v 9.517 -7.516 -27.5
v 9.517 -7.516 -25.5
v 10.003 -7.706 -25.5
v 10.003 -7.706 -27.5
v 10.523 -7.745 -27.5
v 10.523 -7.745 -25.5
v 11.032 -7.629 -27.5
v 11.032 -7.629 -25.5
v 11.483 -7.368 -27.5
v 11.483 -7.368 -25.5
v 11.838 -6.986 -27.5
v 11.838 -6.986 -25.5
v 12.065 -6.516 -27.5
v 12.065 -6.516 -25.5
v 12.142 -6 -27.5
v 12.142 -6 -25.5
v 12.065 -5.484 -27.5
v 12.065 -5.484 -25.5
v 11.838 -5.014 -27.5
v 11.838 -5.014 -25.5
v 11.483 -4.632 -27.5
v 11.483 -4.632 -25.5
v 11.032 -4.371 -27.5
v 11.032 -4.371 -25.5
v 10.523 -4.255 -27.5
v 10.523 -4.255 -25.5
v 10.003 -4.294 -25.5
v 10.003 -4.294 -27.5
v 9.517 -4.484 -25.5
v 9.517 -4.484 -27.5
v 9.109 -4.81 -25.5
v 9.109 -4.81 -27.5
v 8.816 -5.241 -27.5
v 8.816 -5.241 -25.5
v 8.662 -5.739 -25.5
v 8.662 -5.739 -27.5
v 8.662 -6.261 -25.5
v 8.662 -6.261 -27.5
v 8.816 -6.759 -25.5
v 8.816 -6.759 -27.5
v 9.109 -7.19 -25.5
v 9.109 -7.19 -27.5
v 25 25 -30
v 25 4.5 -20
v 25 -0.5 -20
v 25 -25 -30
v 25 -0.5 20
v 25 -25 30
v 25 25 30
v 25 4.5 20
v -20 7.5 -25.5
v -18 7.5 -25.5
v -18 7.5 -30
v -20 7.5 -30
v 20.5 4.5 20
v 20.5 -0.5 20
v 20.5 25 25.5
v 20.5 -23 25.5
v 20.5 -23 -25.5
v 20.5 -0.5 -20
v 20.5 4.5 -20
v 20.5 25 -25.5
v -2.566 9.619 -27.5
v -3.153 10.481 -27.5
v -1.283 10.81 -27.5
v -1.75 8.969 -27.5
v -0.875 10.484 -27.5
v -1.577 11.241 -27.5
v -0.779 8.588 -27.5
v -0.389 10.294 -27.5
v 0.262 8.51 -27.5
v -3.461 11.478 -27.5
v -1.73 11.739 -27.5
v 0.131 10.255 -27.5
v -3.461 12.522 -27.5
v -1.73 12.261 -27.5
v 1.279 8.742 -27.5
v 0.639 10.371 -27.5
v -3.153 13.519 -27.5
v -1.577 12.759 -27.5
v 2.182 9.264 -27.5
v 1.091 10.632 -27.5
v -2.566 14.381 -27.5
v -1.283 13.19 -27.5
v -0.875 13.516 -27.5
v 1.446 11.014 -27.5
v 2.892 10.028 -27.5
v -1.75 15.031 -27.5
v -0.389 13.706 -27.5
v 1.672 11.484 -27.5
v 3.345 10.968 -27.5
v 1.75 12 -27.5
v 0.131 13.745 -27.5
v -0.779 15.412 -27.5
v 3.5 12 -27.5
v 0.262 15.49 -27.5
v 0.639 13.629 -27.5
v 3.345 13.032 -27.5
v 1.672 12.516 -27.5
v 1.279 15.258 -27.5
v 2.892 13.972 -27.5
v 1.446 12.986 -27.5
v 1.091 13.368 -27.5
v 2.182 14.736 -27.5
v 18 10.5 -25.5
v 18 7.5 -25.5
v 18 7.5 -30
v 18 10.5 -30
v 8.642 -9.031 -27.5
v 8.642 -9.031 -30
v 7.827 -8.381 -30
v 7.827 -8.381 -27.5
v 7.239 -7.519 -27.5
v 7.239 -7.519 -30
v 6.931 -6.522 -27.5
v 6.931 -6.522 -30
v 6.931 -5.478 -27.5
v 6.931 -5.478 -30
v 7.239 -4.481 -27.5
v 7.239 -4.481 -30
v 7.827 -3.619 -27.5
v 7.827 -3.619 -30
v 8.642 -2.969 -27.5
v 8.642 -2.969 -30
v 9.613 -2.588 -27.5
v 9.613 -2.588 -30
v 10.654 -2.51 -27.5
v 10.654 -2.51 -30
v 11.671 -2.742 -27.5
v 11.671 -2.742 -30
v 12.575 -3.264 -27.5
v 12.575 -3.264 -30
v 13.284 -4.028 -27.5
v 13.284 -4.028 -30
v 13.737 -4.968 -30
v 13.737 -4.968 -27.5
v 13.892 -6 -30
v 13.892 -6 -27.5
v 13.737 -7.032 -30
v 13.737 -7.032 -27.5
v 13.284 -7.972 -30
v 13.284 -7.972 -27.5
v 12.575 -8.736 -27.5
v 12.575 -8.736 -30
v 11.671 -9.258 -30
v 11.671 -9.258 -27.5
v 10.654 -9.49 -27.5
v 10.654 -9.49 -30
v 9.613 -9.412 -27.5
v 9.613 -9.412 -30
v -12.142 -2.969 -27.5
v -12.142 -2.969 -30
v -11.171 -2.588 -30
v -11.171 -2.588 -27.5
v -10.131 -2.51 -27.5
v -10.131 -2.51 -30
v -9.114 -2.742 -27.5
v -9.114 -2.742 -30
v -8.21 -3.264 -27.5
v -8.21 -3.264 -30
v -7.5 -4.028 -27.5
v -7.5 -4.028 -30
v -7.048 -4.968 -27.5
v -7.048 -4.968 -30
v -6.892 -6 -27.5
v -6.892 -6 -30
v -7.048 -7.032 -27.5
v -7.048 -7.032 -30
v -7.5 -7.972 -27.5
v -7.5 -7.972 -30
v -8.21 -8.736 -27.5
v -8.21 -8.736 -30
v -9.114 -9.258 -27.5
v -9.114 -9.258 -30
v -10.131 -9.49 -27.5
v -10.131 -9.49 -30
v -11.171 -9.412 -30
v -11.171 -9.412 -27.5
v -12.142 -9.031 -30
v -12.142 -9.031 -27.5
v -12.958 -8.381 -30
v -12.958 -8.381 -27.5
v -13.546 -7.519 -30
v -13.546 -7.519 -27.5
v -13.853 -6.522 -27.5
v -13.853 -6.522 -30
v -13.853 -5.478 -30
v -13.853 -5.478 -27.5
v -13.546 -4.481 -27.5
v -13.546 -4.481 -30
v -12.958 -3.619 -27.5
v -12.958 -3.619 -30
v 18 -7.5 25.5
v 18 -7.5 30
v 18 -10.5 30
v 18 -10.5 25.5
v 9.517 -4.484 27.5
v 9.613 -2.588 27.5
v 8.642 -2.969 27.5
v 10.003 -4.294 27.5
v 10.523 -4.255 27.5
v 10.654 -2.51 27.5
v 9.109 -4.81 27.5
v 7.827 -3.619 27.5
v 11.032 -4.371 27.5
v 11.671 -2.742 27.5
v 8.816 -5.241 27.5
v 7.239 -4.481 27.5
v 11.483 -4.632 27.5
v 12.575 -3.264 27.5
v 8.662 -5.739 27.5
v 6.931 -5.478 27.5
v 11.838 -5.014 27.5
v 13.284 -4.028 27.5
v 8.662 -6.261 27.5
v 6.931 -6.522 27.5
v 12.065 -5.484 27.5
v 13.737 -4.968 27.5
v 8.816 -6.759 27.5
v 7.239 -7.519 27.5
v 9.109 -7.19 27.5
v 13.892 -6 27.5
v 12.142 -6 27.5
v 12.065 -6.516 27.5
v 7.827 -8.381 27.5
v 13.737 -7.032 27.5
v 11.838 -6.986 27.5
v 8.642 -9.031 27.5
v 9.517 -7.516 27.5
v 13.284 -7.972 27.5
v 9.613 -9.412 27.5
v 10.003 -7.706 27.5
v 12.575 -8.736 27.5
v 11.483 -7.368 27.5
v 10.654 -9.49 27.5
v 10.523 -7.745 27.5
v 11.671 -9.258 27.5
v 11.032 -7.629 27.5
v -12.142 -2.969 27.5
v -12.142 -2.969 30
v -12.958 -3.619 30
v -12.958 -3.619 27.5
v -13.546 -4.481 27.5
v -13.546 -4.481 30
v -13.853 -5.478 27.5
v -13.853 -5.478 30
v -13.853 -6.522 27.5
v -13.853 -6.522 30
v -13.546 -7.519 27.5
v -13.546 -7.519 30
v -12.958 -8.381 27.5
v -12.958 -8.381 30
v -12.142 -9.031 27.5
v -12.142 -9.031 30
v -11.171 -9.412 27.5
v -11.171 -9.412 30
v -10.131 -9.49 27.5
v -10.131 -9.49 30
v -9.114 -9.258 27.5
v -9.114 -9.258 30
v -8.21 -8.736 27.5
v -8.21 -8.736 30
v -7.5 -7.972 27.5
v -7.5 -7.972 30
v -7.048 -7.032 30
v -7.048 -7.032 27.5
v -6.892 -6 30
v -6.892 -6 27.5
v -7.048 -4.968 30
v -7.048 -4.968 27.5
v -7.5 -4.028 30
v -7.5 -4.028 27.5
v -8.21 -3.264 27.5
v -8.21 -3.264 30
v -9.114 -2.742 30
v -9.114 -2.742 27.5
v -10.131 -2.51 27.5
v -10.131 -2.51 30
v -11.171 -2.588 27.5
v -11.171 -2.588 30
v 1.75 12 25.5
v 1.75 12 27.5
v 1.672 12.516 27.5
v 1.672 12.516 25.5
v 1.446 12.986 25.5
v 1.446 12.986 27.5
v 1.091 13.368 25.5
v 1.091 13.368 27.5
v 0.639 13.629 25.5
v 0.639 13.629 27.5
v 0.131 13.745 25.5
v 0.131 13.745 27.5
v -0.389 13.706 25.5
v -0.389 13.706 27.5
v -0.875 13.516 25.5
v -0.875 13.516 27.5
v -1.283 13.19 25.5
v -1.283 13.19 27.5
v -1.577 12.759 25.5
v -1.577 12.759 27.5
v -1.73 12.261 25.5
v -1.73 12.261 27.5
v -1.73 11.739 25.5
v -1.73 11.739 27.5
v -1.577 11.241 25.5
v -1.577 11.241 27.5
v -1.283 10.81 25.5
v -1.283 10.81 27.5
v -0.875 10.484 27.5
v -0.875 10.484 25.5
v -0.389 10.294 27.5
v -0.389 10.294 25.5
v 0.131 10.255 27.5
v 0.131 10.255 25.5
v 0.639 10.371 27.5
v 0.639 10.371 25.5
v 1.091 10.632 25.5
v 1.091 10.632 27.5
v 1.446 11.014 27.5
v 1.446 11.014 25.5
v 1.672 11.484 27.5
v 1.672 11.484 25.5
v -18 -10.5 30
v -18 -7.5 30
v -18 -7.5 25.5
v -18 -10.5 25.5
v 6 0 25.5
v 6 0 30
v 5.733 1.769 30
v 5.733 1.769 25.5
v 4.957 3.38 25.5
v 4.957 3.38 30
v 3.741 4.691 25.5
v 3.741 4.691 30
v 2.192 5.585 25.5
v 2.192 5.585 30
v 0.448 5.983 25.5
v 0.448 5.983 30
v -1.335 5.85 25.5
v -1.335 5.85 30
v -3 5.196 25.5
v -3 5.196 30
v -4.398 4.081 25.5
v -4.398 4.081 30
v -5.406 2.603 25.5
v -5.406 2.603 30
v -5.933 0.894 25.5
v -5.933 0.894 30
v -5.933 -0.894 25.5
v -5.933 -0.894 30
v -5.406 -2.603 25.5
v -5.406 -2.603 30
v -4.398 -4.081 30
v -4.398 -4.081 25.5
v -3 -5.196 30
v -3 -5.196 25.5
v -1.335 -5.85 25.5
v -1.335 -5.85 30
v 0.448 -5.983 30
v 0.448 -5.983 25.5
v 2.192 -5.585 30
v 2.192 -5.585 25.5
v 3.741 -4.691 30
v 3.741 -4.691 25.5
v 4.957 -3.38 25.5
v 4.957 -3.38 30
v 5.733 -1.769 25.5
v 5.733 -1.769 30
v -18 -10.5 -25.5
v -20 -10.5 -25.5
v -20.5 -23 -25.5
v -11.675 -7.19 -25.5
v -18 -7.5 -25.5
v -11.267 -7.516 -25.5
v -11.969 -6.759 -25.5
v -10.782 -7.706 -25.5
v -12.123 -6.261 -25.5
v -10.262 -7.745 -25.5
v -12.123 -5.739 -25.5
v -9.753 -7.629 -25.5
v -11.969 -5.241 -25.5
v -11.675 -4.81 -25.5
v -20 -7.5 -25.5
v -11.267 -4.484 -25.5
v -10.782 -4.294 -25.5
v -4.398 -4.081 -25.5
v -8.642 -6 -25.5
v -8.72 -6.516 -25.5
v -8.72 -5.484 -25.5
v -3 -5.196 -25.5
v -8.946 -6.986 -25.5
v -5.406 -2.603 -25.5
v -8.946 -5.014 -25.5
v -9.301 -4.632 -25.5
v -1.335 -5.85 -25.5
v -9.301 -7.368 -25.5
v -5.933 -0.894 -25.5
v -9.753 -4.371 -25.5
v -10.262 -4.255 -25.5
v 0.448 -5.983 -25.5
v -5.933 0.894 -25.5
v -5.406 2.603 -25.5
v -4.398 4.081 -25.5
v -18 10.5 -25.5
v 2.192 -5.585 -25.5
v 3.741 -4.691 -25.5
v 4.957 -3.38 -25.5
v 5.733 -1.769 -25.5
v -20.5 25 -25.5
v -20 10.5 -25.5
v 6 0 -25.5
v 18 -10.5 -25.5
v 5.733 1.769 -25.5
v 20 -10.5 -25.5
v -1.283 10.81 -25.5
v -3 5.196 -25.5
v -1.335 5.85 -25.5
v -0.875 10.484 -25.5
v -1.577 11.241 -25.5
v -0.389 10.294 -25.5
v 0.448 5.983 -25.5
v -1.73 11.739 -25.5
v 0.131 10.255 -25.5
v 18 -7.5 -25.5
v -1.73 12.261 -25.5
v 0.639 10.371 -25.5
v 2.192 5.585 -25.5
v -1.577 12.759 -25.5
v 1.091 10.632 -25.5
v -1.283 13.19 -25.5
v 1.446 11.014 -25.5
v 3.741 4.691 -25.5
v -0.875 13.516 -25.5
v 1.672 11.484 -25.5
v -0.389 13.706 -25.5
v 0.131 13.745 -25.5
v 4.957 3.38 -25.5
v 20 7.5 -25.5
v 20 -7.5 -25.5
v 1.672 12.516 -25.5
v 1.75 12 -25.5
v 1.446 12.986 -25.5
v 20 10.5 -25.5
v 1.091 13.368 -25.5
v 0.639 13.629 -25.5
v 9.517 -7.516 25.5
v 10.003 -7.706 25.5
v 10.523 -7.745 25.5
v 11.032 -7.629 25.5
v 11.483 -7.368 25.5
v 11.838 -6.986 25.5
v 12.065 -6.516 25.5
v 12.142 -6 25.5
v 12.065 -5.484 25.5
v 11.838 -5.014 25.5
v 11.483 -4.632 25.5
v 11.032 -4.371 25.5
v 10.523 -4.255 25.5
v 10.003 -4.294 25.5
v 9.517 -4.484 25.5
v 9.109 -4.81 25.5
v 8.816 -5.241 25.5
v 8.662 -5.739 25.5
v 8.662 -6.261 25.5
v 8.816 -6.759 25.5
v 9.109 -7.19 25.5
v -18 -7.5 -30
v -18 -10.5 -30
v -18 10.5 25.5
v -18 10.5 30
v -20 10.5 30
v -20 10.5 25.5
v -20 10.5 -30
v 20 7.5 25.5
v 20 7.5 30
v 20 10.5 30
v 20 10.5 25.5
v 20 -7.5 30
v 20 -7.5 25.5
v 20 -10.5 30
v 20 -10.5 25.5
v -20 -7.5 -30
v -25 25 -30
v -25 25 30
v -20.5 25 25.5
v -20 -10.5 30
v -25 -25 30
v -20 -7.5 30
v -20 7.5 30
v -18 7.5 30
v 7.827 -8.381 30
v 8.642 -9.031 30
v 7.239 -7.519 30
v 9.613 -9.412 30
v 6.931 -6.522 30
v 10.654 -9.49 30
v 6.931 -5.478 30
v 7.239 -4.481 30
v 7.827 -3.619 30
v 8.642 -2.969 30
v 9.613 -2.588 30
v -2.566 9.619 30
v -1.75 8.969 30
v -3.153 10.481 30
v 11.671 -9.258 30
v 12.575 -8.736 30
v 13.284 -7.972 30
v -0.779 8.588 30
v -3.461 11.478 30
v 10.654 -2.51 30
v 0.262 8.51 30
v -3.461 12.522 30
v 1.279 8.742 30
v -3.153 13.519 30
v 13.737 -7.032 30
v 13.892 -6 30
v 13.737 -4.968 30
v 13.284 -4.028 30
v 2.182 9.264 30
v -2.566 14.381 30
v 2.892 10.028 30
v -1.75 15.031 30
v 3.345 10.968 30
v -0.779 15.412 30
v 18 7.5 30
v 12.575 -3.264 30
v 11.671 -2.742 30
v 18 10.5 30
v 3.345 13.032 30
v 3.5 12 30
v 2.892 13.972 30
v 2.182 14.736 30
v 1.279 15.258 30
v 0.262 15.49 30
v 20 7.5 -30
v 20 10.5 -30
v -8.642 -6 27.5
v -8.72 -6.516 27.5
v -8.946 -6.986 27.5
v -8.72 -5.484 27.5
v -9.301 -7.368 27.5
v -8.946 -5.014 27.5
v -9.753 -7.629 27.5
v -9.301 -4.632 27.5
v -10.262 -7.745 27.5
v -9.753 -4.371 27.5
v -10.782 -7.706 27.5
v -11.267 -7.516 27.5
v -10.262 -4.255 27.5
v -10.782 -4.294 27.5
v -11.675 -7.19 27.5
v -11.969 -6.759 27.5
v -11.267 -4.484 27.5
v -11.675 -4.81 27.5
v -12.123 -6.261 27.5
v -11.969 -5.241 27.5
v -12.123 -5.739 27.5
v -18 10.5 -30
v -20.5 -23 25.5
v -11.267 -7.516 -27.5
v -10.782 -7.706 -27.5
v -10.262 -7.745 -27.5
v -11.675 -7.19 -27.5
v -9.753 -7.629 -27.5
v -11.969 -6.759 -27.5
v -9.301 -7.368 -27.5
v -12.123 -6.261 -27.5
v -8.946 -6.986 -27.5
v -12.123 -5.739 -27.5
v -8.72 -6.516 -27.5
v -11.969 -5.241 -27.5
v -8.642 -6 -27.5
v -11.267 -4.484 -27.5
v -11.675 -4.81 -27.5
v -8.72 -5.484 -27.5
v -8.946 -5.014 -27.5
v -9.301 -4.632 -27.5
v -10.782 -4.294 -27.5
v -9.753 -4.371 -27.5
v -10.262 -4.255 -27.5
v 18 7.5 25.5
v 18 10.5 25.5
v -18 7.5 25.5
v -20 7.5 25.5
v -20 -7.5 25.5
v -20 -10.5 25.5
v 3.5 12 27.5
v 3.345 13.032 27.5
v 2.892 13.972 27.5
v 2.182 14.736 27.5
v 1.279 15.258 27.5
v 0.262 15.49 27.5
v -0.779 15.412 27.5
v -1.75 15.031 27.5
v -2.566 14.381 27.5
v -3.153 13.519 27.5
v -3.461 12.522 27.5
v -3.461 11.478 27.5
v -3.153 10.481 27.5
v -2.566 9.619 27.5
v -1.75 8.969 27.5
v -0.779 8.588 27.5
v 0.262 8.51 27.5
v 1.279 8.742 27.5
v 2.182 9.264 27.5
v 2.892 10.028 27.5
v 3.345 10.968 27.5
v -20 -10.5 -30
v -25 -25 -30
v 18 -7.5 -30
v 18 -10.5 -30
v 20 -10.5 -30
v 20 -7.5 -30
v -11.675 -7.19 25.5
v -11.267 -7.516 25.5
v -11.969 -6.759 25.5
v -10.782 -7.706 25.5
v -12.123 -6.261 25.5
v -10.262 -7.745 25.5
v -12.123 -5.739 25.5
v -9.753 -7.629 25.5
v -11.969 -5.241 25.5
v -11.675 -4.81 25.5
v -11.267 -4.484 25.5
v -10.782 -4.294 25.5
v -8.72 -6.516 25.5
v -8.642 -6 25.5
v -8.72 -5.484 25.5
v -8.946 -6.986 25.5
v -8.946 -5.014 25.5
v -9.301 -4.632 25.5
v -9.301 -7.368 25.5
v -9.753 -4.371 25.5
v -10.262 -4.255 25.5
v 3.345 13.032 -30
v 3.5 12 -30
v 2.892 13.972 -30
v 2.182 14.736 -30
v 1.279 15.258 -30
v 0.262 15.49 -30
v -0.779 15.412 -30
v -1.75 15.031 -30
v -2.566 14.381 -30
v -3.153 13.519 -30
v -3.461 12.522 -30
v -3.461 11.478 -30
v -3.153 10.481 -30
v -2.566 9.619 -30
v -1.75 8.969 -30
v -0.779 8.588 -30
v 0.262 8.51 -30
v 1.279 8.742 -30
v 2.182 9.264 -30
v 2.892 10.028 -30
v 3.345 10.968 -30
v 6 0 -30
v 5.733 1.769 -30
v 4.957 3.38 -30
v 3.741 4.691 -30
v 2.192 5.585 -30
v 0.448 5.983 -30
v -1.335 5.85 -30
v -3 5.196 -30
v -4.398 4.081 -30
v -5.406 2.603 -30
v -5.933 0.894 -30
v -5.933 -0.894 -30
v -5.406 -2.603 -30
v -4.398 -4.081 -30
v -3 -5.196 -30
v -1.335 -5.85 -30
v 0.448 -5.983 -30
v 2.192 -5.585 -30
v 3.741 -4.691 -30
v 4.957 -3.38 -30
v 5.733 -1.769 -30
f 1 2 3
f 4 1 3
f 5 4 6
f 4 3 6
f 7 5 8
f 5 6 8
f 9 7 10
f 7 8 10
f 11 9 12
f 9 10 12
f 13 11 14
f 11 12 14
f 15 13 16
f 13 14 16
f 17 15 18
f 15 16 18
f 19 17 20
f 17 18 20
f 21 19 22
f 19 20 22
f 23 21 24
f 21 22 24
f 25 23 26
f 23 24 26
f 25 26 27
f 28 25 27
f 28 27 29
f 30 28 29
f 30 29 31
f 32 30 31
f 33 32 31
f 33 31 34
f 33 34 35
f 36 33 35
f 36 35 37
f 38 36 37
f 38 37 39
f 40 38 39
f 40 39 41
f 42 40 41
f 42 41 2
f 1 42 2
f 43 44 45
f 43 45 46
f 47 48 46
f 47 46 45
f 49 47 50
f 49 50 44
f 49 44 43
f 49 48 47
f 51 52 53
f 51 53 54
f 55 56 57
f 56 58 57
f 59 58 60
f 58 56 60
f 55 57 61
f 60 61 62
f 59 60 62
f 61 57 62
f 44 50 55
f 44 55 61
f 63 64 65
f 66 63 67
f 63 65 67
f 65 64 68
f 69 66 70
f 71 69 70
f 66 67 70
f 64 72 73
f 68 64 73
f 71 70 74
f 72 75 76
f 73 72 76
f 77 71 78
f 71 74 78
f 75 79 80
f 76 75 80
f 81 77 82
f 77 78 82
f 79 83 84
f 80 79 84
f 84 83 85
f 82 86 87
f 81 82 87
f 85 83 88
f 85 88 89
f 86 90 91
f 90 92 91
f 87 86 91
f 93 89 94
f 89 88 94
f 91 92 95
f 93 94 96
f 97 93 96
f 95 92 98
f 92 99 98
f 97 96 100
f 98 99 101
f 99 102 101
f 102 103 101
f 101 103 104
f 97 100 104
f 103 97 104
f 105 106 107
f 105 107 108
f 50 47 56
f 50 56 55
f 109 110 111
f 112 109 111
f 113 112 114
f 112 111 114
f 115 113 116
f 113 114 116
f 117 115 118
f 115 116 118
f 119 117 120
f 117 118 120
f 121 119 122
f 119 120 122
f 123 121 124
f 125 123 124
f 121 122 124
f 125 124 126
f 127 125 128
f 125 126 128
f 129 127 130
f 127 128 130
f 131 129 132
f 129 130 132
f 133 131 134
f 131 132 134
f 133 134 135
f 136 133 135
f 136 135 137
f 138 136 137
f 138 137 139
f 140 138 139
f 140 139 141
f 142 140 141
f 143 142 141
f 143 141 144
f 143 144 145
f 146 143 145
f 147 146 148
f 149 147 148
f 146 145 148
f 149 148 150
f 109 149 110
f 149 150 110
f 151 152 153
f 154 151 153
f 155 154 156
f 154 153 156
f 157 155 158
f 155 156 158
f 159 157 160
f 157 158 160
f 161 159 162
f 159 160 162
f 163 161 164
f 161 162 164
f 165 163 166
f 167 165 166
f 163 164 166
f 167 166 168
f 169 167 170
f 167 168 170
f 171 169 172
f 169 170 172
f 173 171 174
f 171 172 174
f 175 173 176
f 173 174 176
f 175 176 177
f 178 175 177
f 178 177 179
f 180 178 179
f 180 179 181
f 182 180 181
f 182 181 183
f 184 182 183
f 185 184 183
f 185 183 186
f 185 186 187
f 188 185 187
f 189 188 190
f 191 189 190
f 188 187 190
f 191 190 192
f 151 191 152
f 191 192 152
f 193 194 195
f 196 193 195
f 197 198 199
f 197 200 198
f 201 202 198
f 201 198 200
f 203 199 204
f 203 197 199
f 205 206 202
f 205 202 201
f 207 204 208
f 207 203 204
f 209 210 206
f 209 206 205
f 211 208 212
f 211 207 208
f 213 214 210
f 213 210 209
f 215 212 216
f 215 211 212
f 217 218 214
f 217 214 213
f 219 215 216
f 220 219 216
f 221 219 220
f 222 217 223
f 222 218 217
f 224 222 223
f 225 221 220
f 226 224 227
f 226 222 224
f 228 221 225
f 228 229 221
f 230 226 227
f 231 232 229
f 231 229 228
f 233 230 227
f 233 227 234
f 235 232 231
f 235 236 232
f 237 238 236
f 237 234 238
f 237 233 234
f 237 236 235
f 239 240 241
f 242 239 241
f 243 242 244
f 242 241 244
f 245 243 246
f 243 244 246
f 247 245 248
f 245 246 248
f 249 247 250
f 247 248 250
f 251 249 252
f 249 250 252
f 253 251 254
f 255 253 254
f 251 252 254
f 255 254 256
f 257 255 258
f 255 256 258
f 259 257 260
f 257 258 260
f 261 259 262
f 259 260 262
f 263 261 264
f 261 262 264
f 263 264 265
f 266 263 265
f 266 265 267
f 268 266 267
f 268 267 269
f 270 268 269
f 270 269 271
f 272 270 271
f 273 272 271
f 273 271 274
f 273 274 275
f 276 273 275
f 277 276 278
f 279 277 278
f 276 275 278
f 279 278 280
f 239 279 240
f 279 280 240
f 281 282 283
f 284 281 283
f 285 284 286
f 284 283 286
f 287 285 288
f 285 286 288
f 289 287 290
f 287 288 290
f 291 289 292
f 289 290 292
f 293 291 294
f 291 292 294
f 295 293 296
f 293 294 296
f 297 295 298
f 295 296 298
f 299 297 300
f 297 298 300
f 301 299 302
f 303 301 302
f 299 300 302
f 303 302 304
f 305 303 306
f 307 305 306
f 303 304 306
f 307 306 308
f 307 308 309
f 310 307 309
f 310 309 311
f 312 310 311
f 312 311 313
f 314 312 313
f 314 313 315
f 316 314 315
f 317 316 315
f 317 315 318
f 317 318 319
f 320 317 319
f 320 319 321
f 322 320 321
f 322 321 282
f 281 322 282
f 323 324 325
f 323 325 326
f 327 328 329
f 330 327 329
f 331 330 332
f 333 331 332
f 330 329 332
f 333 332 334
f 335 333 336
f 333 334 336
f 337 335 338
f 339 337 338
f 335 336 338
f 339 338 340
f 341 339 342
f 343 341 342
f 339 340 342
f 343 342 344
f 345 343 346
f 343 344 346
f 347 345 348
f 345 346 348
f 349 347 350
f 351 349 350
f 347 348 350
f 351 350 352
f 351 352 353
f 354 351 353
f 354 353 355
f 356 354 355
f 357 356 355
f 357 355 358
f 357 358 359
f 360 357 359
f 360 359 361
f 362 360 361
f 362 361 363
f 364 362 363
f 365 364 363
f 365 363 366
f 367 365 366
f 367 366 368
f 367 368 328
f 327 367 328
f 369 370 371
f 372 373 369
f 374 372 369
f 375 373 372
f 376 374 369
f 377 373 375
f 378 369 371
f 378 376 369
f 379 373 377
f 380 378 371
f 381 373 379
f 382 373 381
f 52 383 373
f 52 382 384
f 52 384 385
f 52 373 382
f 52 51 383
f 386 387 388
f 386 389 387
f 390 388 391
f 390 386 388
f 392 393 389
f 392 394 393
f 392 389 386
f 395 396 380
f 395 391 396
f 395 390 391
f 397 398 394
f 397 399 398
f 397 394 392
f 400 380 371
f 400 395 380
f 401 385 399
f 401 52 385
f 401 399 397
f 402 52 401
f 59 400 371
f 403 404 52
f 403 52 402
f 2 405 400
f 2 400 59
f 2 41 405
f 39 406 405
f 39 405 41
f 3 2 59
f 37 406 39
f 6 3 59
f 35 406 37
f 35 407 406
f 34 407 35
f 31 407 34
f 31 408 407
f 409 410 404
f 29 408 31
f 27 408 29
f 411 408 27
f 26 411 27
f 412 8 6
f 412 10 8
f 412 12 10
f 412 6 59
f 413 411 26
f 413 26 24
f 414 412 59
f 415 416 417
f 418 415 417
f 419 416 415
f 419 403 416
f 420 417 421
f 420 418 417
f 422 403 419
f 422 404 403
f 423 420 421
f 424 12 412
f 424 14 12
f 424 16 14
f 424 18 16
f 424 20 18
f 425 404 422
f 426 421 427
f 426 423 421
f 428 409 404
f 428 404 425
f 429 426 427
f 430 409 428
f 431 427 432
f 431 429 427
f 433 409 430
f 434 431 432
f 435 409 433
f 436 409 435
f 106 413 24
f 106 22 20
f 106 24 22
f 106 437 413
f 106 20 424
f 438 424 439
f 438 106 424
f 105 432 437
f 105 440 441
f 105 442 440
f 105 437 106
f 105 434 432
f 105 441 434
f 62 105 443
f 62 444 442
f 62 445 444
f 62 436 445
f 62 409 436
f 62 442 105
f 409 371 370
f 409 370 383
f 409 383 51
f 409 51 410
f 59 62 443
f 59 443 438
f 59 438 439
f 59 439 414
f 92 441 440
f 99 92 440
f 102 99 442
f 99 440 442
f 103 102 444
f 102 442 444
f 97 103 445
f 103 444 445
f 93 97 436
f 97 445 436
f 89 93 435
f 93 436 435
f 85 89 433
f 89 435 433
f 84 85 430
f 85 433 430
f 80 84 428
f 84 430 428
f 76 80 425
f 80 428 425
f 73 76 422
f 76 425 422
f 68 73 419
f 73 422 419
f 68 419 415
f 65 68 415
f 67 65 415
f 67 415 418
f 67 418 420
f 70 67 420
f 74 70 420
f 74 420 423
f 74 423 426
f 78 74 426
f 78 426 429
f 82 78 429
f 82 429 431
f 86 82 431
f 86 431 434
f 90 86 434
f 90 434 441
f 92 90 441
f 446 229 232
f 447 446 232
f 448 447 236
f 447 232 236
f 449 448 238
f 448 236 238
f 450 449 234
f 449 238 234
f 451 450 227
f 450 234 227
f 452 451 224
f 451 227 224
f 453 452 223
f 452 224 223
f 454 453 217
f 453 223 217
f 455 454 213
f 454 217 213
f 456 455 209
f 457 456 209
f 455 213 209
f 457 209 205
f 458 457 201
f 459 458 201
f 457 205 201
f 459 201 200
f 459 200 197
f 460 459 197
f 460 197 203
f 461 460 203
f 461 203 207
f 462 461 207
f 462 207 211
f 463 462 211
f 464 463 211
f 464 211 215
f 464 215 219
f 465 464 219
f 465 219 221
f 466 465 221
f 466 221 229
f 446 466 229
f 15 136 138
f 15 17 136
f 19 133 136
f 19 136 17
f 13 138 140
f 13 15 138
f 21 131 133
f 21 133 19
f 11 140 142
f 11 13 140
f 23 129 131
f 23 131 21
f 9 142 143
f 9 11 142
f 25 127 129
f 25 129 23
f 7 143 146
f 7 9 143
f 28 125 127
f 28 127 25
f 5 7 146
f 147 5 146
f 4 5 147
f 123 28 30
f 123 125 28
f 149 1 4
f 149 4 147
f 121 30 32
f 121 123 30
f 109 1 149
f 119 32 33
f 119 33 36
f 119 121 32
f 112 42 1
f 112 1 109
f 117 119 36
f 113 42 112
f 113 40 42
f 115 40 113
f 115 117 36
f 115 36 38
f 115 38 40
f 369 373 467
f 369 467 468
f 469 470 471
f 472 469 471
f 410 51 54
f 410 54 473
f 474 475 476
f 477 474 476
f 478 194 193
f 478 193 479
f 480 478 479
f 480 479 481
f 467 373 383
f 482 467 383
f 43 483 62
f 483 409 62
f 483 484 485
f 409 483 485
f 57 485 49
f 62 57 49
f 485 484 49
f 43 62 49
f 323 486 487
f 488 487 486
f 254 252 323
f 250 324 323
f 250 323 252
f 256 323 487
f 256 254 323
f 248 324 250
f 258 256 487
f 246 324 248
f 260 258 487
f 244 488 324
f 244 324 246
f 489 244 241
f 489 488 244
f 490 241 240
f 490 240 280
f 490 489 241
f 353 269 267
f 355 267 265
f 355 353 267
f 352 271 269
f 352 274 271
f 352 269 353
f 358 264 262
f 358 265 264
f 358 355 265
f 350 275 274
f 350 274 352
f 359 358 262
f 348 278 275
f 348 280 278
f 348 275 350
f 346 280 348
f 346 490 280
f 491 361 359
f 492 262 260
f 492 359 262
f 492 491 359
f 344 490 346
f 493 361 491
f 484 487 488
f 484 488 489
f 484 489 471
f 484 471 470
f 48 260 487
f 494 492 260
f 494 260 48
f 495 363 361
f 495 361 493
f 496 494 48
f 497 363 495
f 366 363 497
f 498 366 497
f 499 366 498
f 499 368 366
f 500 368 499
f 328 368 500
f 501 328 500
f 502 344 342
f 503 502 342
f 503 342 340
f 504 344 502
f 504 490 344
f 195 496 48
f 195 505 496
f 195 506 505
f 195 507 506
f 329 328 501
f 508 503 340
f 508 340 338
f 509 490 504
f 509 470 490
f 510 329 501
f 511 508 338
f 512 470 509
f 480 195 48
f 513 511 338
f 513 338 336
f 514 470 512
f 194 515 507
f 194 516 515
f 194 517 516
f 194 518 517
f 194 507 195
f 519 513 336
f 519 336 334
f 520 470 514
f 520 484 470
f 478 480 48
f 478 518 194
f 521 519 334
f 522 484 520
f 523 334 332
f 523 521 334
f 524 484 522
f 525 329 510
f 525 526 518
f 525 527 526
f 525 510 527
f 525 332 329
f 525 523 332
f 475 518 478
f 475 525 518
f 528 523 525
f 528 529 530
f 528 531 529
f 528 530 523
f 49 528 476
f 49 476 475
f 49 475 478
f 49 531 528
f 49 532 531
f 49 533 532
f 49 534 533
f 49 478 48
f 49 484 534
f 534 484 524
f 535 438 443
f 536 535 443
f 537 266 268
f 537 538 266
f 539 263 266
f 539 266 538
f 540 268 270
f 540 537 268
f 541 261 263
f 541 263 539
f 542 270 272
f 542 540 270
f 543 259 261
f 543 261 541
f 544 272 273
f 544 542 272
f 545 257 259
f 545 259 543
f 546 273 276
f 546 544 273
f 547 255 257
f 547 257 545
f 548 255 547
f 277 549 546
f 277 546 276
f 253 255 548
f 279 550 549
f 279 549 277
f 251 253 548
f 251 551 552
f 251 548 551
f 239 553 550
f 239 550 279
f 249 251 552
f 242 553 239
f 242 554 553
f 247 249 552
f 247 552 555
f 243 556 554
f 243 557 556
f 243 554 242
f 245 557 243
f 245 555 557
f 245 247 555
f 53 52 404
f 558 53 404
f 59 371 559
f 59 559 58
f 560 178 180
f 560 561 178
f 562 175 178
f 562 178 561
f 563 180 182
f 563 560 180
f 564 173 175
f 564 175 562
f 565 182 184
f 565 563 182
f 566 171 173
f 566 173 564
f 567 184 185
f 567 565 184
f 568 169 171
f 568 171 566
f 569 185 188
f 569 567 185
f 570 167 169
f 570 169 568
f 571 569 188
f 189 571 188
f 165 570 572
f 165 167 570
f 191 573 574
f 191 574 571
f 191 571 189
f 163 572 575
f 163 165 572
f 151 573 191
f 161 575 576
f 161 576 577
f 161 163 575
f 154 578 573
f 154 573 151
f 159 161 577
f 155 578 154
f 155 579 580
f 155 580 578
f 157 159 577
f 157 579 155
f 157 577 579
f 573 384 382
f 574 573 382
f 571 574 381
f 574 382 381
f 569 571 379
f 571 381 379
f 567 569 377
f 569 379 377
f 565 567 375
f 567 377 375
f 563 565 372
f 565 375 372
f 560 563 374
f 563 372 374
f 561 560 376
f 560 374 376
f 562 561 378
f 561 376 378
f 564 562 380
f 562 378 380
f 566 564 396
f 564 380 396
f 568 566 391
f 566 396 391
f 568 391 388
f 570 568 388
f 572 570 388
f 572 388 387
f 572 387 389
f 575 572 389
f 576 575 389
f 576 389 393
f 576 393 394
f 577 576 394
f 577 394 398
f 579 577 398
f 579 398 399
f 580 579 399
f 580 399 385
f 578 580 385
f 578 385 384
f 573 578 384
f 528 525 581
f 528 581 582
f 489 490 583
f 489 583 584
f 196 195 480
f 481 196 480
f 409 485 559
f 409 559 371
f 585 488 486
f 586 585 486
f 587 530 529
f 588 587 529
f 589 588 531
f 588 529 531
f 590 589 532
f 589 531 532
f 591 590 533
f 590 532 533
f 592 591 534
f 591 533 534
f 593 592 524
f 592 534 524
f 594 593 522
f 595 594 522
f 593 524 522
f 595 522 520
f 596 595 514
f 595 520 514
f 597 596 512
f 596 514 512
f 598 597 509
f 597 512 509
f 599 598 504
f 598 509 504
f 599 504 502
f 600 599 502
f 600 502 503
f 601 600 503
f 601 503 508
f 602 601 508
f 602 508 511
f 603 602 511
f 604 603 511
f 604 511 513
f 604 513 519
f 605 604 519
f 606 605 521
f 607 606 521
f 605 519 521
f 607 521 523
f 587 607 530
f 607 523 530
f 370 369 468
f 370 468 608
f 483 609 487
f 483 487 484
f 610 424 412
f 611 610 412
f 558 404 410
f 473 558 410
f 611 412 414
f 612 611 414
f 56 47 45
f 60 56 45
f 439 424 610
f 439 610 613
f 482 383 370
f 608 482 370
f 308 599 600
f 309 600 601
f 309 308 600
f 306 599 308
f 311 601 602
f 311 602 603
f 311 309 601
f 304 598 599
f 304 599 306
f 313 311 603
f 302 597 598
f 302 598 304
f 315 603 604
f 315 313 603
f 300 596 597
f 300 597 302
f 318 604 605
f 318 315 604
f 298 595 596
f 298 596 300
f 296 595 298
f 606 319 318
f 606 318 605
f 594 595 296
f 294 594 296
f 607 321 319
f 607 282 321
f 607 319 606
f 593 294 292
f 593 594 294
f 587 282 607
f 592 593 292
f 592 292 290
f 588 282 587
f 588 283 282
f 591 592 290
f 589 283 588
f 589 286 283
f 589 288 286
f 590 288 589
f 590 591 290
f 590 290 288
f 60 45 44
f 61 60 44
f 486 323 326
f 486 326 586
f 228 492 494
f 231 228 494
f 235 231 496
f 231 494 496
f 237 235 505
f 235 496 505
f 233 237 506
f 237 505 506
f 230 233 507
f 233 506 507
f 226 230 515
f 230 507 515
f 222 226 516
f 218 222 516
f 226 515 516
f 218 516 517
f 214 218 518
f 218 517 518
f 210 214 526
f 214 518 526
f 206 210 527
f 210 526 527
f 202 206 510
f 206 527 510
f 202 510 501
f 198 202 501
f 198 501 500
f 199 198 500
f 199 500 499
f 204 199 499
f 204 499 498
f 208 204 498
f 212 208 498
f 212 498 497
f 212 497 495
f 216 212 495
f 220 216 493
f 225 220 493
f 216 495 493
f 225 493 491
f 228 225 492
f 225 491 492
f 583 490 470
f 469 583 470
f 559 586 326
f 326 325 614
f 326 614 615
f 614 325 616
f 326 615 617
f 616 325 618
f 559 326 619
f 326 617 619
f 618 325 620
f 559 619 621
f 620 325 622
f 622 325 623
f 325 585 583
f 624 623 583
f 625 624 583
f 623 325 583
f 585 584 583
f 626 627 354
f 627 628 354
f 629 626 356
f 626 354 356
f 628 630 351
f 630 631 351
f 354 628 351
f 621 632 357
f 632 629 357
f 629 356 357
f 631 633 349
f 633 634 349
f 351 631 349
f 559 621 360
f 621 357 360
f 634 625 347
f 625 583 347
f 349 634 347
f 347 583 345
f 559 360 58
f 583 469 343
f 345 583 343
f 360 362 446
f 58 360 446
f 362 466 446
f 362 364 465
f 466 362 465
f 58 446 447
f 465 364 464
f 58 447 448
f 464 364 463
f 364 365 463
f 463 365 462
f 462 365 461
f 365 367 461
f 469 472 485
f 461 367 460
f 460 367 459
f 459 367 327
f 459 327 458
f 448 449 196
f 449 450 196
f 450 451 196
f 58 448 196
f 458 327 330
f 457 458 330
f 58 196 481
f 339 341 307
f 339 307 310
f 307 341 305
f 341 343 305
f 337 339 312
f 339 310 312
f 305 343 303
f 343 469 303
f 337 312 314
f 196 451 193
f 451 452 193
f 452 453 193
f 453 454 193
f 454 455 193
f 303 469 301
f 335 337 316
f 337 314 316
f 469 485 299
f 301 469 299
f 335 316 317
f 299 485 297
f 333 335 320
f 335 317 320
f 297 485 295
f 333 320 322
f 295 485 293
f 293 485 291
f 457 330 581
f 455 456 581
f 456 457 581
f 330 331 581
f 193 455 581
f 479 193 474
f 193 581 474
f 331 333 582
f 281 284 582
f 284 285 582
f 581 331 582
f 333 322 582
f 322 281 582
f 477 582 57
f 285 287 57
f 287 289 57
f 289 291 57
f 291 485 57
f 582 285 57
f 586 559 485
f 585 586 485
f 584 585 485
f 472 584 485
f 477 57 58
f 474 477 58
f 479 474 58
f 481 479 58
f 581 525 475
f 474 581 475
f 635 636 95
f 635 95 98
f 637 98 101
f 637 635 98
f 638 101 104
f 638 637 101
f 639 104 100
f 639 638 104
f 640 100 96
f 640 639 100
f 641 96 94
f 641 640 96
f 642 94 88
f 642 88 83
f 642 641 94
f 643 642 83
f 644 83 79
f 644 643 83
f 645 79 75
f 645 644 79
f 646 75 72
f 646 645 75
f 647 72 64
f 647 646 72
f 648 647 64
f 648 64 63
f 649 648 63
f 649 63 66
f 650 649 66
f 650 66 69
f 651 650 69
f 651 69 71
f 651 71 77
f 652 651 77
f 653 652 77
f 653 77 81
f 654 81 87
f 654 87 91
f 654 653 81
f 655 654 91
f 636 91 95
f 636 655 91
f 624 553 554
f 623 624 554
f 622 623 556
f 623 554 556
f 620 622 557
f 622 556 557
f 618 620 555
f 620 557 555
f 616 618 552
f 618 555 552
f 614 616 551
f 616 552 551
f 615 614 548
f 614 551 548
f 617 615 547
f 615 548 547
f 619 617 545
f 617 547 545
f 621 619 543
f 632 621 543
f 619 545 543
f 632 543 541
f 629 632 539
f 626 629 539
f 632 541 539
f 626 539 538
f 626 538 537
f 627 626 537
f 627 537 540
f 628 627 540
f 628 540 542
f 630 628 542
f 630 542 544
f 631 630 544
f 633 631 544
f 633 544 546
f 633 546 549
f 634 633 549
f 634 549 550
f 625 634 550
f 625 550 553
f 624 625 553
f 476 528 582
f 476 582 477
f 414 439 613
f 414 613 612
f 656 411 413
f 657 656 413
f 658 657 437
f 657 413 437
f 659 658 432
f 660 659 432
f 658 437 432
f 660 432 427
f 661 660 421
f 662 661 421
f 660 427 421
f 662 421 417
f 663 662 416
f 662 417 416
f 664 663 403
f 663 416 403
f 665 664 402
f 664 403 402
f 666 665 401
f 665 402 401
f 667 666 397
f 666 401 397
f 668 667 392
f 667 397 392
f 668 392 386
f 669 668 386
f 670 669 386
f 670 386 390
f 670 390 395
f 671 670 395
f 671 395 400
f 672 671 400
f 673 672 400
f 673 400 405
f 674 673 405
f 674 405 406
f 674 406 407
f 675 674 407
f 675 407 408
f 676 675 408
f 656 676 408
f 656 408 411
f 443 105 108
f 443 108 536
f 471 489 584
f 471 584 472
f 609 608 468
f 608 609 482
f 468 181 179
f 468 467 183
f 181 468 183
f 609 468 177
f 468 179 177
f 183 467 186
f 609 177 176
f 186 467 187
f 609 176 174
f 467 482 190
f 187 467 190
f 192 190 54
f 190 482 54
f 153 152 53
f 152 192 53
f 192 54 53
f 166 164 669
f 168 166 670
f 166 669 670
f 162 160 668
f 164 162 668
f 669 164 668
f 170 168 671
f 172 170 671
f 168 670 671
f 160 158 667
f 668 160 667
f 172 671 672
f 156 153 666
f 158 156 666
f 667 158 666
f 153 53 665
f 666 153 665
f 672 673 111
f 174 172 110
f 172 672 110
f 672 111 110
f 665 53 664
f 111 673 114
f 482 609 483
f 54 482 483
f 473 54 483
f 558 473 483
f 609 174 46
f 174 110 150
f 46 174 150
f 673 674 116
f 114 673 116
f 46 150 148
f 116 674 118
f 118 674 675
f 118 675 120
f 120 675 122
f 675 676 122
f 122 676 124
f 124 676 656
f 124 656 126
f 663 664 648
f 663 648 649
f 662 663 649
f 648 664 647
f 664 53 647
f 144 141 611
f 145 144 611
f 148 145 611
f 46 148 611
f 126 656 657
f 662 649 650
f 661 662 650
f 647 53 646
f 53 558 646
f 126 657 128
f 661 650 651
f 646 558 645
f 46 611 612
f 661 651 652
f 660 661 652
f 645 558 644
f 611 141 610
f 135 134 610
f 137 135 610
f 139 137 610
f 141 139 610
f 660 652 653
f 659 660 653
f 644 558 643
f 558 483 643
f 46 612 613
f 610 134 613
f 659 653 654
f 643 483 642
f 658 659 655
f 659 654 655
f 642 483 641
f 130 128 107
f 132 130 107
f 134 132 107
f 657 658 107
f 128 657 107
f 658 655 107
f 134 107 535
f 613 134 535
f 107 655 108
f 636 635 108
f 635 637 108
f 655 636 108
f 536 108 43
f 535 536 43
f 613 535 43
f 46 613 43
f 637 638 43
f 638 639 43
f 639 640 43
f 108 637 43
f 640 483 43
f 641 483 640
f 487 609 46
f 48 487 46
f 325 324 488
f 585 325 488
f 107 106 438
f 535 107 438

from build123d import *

# Parameters (mm, degrees)
SKETCH1_W                                  = 50
SKETCH1_H                                  = 50
BOSS_EXTRUDE1_DEPTH                        = 30
SKETCH3_R                                  = 6
CUT_EXTRUDE1_DEPTH                         = 70
SKETCH5_W                                  = 41
SKETCH5_H                                  = 51
CUT_EXTRUDE3_DEPTH                         = 48
SKETCH7_R                                  = 1.75
CUT_EXTRUDE5_DEPTH                         = 60
CIRPATTERN3_COUNT                          = 3
SKETCH8_W                                  = 2
SKETCH8_H                                  = 3
CUT_EXTRUDE6_DEPTH                         = 60
MIRROR1_AT_THE_SECOND_PLANE_COPY_1_SKETC_W = 2
MIRROR1_AT_THE_SECOND_PLANE_COPY_1_SKETC_H = 3
MIRROR1_AT_THE_SECOND_PLANE_COPY_1_DEPTH   = 60
SKETCH9_W                                  = 40
SKETCH9_H                                  = 5
CUT_EXTRUDE7_DEPTH                         = 40
SKETCH10_R                                 = 3.5
CUT_EXTRUDE8_DEPTH                         = 2.5
CIRPATTERN4_COUNT                          = 3
MIRROR2_COPY_1_SKETCH_R                    = 3.5
MIRROR2_COPY_1_DEPTH                       = 2.5
MIRROR2_COPY_2_SKETCH_R                    = 3.5
MIRROR2_COPY_2_DEPTH                       = 2.5


with BuildPart() as part:
    # Sketch1 → Boss-Extrude1 (new, symmetric)
    with BuildSketch(Plane.XY):
        Rectangle(SKETCH1_W, SKETCH1_H)
    extrude(amount=BOSS_EXTRUDE1_DEPTH, both=True)

    # Sketch3 → Cut-Extrude1 (cut)
    with BuildSketch(Plane.XY.offset(30)):
        Circle(SKETCH3_R)
    extrude(amount=-CUT_EXTRUDE1_DEPTH, mode=Mode.SUBTRACT)

    # Sketch5 → Cut-Extrude3 (cut)
    with BuildSketch(Plane(origin=(0, 25, 0), x_dir=(1, 0, 0), z_dir=(0, 1, 0))):
        Rectangle(SKETCH5_W, SKETCH5_H)
    extrude(amount=-CUT_EXTRUDE3_DEPTH, mode=Mode.SUBTRACT)

    # Sketch7 → Cut-Extrude5 (cut)
    with BuildSketch(Plane.XY.offset(30)):
        with Locations((0, 12)):
            Circle(SKETCH7_R)
    cut_extrude5 = extrude(amount=-CUT_EXTRUDE5_DEPTH, mode=Mode.SUBTRACT)

    # CirPattern3: Cut-Extrude5 ×3 about axis
    cirpattern3_axis = Axis((0, 0, 0), (0, 0, 1))
    for i in range(1, CIRPATTERN3_COUNT):
        add(cut_extrude5.rotate(cirpattern3_axis, i * 360 / CIRPATTERN3_COUNT), mode=Mode.SUBTRACT)

    # Sketch8 → Cut-Extrude6 (cut)
    with BuildSketch(Plane.XY.offset(30)):
        with Locations((19, 9)):
            Rectangle(SKETCH8_W, SKETCH8_H)
    cut_extrude6 = extrude(amount=-CUT_EXTRUDE6_DEPTH, mode=Mode.SUBTRACT)

    # Mirror1: Cut-Extrude6 across plane
    add(cut_extrude6.mirror(Plane.ZX), mode=Mode.SUBTRACT)

    # Mirror1 at the second plane: Cut-Extrude6 across plane
    add(cut_extrude6.mirror(Plane(origin=(0, 0, 0), x_dir=(0, 0, 1), z_dir=(1, 0, 0))), mode=Mode.SUBTRACT)

    # Mirror1 at the second plane copy 1 sketc → Mirror1 at the second plane copy 1 (cut)
    with BuildSketch(Plane(origin=(0, 0, 30), x_dir=(-1, 0, 0), z_dir=(0, 0, 1))):
        with Locations((19, 9)):
            Rectangle(MIRROR1_AT_THE_SECOND_PLANE_COPY_1_SKETC_W, MIRROR1_AT_THE_SECOND_PLANE_COPY_1_SKETC_H)
    extrude(amount=-MIRROR1_AT_THE_SECOND_PLANE_COPY_1_DEPTH, mode=Mode.SUBTRACT)

    # Sketch9 → Cut-Extrude7 (cut)
    with BuildSketch(Plane(origin=(25, 0, 0), x_dir=(0, 0, -1), z_dir=(1, 0, 0))):
        with Locations((0, 2)):
            Rectangle(SKETCH9_W, SKETCH9_H)
    extrude(amount=-CUT_EXTRUDE7_DEPTH, mode=Mode.SUBTRACT)

    # Sketch10 → Cut-Extrude8 (cut)
    with BuildSketch(Plane.XY.offset(30)):
        with Locations((0, 12)):
            Circle(SKETCH10_R)
    cut_extrude8 = extrude(amount=-CUT_EXTRUDE8_DEPTH, mode=Mode.SUBTRACT)

    # CirPattern4: Cut-Extrude8 ×3 about axis
    cirpattern4_axis = Axis((0, 0, 0), (0, 0, 1))
    for i in range(1, CIRPATTERN4_COUNT):
        add(cut_extrude8.rotate(cirpattern4_axis, i * 360 / CIRPATTERN4_COUNT), mode=Mode.SUBTRACT)

    # Mirror2: Cut-Extrude8 across plane
    add(cut_extrude8.mirror(Plane.XY), mode=Mode.SUBTRACT)

    # Mirror2 copy 1 sketch → Mirror2 copy 1 (cut)
    with BuildSketch(Plane(origin=(0, 0, -30), x_dir=(-0.4999999999999998, 0.8660254037844387, 0), z_dir=(0, 0, -1))):
        with Locations((0, -12)):
            Circle(MIRROR2_COPY_1_SKETCH_R)
    extrude(amount=-MIRROR2_COPY_1_DEPTH, mode=Mode.SUBTRACT)

    # Mirror2 copy 2 sketch → Mirror2 copy 2 (cut)
    with BuildSketch(Plane(origin=(0, 0, -30), x_dir=(-0.5000000000000004, -0.8660254037844384, 0), z_dir=(0, 0, -1))):
        with Locations((0, -12)):
            Circle(MIRROR2_COPY_2_SKETCH_R)
    extrude(amount=-MIRROR2_COPY_2_DEPTH, mode=Mode.SUBTRACT)


solid = part.part
